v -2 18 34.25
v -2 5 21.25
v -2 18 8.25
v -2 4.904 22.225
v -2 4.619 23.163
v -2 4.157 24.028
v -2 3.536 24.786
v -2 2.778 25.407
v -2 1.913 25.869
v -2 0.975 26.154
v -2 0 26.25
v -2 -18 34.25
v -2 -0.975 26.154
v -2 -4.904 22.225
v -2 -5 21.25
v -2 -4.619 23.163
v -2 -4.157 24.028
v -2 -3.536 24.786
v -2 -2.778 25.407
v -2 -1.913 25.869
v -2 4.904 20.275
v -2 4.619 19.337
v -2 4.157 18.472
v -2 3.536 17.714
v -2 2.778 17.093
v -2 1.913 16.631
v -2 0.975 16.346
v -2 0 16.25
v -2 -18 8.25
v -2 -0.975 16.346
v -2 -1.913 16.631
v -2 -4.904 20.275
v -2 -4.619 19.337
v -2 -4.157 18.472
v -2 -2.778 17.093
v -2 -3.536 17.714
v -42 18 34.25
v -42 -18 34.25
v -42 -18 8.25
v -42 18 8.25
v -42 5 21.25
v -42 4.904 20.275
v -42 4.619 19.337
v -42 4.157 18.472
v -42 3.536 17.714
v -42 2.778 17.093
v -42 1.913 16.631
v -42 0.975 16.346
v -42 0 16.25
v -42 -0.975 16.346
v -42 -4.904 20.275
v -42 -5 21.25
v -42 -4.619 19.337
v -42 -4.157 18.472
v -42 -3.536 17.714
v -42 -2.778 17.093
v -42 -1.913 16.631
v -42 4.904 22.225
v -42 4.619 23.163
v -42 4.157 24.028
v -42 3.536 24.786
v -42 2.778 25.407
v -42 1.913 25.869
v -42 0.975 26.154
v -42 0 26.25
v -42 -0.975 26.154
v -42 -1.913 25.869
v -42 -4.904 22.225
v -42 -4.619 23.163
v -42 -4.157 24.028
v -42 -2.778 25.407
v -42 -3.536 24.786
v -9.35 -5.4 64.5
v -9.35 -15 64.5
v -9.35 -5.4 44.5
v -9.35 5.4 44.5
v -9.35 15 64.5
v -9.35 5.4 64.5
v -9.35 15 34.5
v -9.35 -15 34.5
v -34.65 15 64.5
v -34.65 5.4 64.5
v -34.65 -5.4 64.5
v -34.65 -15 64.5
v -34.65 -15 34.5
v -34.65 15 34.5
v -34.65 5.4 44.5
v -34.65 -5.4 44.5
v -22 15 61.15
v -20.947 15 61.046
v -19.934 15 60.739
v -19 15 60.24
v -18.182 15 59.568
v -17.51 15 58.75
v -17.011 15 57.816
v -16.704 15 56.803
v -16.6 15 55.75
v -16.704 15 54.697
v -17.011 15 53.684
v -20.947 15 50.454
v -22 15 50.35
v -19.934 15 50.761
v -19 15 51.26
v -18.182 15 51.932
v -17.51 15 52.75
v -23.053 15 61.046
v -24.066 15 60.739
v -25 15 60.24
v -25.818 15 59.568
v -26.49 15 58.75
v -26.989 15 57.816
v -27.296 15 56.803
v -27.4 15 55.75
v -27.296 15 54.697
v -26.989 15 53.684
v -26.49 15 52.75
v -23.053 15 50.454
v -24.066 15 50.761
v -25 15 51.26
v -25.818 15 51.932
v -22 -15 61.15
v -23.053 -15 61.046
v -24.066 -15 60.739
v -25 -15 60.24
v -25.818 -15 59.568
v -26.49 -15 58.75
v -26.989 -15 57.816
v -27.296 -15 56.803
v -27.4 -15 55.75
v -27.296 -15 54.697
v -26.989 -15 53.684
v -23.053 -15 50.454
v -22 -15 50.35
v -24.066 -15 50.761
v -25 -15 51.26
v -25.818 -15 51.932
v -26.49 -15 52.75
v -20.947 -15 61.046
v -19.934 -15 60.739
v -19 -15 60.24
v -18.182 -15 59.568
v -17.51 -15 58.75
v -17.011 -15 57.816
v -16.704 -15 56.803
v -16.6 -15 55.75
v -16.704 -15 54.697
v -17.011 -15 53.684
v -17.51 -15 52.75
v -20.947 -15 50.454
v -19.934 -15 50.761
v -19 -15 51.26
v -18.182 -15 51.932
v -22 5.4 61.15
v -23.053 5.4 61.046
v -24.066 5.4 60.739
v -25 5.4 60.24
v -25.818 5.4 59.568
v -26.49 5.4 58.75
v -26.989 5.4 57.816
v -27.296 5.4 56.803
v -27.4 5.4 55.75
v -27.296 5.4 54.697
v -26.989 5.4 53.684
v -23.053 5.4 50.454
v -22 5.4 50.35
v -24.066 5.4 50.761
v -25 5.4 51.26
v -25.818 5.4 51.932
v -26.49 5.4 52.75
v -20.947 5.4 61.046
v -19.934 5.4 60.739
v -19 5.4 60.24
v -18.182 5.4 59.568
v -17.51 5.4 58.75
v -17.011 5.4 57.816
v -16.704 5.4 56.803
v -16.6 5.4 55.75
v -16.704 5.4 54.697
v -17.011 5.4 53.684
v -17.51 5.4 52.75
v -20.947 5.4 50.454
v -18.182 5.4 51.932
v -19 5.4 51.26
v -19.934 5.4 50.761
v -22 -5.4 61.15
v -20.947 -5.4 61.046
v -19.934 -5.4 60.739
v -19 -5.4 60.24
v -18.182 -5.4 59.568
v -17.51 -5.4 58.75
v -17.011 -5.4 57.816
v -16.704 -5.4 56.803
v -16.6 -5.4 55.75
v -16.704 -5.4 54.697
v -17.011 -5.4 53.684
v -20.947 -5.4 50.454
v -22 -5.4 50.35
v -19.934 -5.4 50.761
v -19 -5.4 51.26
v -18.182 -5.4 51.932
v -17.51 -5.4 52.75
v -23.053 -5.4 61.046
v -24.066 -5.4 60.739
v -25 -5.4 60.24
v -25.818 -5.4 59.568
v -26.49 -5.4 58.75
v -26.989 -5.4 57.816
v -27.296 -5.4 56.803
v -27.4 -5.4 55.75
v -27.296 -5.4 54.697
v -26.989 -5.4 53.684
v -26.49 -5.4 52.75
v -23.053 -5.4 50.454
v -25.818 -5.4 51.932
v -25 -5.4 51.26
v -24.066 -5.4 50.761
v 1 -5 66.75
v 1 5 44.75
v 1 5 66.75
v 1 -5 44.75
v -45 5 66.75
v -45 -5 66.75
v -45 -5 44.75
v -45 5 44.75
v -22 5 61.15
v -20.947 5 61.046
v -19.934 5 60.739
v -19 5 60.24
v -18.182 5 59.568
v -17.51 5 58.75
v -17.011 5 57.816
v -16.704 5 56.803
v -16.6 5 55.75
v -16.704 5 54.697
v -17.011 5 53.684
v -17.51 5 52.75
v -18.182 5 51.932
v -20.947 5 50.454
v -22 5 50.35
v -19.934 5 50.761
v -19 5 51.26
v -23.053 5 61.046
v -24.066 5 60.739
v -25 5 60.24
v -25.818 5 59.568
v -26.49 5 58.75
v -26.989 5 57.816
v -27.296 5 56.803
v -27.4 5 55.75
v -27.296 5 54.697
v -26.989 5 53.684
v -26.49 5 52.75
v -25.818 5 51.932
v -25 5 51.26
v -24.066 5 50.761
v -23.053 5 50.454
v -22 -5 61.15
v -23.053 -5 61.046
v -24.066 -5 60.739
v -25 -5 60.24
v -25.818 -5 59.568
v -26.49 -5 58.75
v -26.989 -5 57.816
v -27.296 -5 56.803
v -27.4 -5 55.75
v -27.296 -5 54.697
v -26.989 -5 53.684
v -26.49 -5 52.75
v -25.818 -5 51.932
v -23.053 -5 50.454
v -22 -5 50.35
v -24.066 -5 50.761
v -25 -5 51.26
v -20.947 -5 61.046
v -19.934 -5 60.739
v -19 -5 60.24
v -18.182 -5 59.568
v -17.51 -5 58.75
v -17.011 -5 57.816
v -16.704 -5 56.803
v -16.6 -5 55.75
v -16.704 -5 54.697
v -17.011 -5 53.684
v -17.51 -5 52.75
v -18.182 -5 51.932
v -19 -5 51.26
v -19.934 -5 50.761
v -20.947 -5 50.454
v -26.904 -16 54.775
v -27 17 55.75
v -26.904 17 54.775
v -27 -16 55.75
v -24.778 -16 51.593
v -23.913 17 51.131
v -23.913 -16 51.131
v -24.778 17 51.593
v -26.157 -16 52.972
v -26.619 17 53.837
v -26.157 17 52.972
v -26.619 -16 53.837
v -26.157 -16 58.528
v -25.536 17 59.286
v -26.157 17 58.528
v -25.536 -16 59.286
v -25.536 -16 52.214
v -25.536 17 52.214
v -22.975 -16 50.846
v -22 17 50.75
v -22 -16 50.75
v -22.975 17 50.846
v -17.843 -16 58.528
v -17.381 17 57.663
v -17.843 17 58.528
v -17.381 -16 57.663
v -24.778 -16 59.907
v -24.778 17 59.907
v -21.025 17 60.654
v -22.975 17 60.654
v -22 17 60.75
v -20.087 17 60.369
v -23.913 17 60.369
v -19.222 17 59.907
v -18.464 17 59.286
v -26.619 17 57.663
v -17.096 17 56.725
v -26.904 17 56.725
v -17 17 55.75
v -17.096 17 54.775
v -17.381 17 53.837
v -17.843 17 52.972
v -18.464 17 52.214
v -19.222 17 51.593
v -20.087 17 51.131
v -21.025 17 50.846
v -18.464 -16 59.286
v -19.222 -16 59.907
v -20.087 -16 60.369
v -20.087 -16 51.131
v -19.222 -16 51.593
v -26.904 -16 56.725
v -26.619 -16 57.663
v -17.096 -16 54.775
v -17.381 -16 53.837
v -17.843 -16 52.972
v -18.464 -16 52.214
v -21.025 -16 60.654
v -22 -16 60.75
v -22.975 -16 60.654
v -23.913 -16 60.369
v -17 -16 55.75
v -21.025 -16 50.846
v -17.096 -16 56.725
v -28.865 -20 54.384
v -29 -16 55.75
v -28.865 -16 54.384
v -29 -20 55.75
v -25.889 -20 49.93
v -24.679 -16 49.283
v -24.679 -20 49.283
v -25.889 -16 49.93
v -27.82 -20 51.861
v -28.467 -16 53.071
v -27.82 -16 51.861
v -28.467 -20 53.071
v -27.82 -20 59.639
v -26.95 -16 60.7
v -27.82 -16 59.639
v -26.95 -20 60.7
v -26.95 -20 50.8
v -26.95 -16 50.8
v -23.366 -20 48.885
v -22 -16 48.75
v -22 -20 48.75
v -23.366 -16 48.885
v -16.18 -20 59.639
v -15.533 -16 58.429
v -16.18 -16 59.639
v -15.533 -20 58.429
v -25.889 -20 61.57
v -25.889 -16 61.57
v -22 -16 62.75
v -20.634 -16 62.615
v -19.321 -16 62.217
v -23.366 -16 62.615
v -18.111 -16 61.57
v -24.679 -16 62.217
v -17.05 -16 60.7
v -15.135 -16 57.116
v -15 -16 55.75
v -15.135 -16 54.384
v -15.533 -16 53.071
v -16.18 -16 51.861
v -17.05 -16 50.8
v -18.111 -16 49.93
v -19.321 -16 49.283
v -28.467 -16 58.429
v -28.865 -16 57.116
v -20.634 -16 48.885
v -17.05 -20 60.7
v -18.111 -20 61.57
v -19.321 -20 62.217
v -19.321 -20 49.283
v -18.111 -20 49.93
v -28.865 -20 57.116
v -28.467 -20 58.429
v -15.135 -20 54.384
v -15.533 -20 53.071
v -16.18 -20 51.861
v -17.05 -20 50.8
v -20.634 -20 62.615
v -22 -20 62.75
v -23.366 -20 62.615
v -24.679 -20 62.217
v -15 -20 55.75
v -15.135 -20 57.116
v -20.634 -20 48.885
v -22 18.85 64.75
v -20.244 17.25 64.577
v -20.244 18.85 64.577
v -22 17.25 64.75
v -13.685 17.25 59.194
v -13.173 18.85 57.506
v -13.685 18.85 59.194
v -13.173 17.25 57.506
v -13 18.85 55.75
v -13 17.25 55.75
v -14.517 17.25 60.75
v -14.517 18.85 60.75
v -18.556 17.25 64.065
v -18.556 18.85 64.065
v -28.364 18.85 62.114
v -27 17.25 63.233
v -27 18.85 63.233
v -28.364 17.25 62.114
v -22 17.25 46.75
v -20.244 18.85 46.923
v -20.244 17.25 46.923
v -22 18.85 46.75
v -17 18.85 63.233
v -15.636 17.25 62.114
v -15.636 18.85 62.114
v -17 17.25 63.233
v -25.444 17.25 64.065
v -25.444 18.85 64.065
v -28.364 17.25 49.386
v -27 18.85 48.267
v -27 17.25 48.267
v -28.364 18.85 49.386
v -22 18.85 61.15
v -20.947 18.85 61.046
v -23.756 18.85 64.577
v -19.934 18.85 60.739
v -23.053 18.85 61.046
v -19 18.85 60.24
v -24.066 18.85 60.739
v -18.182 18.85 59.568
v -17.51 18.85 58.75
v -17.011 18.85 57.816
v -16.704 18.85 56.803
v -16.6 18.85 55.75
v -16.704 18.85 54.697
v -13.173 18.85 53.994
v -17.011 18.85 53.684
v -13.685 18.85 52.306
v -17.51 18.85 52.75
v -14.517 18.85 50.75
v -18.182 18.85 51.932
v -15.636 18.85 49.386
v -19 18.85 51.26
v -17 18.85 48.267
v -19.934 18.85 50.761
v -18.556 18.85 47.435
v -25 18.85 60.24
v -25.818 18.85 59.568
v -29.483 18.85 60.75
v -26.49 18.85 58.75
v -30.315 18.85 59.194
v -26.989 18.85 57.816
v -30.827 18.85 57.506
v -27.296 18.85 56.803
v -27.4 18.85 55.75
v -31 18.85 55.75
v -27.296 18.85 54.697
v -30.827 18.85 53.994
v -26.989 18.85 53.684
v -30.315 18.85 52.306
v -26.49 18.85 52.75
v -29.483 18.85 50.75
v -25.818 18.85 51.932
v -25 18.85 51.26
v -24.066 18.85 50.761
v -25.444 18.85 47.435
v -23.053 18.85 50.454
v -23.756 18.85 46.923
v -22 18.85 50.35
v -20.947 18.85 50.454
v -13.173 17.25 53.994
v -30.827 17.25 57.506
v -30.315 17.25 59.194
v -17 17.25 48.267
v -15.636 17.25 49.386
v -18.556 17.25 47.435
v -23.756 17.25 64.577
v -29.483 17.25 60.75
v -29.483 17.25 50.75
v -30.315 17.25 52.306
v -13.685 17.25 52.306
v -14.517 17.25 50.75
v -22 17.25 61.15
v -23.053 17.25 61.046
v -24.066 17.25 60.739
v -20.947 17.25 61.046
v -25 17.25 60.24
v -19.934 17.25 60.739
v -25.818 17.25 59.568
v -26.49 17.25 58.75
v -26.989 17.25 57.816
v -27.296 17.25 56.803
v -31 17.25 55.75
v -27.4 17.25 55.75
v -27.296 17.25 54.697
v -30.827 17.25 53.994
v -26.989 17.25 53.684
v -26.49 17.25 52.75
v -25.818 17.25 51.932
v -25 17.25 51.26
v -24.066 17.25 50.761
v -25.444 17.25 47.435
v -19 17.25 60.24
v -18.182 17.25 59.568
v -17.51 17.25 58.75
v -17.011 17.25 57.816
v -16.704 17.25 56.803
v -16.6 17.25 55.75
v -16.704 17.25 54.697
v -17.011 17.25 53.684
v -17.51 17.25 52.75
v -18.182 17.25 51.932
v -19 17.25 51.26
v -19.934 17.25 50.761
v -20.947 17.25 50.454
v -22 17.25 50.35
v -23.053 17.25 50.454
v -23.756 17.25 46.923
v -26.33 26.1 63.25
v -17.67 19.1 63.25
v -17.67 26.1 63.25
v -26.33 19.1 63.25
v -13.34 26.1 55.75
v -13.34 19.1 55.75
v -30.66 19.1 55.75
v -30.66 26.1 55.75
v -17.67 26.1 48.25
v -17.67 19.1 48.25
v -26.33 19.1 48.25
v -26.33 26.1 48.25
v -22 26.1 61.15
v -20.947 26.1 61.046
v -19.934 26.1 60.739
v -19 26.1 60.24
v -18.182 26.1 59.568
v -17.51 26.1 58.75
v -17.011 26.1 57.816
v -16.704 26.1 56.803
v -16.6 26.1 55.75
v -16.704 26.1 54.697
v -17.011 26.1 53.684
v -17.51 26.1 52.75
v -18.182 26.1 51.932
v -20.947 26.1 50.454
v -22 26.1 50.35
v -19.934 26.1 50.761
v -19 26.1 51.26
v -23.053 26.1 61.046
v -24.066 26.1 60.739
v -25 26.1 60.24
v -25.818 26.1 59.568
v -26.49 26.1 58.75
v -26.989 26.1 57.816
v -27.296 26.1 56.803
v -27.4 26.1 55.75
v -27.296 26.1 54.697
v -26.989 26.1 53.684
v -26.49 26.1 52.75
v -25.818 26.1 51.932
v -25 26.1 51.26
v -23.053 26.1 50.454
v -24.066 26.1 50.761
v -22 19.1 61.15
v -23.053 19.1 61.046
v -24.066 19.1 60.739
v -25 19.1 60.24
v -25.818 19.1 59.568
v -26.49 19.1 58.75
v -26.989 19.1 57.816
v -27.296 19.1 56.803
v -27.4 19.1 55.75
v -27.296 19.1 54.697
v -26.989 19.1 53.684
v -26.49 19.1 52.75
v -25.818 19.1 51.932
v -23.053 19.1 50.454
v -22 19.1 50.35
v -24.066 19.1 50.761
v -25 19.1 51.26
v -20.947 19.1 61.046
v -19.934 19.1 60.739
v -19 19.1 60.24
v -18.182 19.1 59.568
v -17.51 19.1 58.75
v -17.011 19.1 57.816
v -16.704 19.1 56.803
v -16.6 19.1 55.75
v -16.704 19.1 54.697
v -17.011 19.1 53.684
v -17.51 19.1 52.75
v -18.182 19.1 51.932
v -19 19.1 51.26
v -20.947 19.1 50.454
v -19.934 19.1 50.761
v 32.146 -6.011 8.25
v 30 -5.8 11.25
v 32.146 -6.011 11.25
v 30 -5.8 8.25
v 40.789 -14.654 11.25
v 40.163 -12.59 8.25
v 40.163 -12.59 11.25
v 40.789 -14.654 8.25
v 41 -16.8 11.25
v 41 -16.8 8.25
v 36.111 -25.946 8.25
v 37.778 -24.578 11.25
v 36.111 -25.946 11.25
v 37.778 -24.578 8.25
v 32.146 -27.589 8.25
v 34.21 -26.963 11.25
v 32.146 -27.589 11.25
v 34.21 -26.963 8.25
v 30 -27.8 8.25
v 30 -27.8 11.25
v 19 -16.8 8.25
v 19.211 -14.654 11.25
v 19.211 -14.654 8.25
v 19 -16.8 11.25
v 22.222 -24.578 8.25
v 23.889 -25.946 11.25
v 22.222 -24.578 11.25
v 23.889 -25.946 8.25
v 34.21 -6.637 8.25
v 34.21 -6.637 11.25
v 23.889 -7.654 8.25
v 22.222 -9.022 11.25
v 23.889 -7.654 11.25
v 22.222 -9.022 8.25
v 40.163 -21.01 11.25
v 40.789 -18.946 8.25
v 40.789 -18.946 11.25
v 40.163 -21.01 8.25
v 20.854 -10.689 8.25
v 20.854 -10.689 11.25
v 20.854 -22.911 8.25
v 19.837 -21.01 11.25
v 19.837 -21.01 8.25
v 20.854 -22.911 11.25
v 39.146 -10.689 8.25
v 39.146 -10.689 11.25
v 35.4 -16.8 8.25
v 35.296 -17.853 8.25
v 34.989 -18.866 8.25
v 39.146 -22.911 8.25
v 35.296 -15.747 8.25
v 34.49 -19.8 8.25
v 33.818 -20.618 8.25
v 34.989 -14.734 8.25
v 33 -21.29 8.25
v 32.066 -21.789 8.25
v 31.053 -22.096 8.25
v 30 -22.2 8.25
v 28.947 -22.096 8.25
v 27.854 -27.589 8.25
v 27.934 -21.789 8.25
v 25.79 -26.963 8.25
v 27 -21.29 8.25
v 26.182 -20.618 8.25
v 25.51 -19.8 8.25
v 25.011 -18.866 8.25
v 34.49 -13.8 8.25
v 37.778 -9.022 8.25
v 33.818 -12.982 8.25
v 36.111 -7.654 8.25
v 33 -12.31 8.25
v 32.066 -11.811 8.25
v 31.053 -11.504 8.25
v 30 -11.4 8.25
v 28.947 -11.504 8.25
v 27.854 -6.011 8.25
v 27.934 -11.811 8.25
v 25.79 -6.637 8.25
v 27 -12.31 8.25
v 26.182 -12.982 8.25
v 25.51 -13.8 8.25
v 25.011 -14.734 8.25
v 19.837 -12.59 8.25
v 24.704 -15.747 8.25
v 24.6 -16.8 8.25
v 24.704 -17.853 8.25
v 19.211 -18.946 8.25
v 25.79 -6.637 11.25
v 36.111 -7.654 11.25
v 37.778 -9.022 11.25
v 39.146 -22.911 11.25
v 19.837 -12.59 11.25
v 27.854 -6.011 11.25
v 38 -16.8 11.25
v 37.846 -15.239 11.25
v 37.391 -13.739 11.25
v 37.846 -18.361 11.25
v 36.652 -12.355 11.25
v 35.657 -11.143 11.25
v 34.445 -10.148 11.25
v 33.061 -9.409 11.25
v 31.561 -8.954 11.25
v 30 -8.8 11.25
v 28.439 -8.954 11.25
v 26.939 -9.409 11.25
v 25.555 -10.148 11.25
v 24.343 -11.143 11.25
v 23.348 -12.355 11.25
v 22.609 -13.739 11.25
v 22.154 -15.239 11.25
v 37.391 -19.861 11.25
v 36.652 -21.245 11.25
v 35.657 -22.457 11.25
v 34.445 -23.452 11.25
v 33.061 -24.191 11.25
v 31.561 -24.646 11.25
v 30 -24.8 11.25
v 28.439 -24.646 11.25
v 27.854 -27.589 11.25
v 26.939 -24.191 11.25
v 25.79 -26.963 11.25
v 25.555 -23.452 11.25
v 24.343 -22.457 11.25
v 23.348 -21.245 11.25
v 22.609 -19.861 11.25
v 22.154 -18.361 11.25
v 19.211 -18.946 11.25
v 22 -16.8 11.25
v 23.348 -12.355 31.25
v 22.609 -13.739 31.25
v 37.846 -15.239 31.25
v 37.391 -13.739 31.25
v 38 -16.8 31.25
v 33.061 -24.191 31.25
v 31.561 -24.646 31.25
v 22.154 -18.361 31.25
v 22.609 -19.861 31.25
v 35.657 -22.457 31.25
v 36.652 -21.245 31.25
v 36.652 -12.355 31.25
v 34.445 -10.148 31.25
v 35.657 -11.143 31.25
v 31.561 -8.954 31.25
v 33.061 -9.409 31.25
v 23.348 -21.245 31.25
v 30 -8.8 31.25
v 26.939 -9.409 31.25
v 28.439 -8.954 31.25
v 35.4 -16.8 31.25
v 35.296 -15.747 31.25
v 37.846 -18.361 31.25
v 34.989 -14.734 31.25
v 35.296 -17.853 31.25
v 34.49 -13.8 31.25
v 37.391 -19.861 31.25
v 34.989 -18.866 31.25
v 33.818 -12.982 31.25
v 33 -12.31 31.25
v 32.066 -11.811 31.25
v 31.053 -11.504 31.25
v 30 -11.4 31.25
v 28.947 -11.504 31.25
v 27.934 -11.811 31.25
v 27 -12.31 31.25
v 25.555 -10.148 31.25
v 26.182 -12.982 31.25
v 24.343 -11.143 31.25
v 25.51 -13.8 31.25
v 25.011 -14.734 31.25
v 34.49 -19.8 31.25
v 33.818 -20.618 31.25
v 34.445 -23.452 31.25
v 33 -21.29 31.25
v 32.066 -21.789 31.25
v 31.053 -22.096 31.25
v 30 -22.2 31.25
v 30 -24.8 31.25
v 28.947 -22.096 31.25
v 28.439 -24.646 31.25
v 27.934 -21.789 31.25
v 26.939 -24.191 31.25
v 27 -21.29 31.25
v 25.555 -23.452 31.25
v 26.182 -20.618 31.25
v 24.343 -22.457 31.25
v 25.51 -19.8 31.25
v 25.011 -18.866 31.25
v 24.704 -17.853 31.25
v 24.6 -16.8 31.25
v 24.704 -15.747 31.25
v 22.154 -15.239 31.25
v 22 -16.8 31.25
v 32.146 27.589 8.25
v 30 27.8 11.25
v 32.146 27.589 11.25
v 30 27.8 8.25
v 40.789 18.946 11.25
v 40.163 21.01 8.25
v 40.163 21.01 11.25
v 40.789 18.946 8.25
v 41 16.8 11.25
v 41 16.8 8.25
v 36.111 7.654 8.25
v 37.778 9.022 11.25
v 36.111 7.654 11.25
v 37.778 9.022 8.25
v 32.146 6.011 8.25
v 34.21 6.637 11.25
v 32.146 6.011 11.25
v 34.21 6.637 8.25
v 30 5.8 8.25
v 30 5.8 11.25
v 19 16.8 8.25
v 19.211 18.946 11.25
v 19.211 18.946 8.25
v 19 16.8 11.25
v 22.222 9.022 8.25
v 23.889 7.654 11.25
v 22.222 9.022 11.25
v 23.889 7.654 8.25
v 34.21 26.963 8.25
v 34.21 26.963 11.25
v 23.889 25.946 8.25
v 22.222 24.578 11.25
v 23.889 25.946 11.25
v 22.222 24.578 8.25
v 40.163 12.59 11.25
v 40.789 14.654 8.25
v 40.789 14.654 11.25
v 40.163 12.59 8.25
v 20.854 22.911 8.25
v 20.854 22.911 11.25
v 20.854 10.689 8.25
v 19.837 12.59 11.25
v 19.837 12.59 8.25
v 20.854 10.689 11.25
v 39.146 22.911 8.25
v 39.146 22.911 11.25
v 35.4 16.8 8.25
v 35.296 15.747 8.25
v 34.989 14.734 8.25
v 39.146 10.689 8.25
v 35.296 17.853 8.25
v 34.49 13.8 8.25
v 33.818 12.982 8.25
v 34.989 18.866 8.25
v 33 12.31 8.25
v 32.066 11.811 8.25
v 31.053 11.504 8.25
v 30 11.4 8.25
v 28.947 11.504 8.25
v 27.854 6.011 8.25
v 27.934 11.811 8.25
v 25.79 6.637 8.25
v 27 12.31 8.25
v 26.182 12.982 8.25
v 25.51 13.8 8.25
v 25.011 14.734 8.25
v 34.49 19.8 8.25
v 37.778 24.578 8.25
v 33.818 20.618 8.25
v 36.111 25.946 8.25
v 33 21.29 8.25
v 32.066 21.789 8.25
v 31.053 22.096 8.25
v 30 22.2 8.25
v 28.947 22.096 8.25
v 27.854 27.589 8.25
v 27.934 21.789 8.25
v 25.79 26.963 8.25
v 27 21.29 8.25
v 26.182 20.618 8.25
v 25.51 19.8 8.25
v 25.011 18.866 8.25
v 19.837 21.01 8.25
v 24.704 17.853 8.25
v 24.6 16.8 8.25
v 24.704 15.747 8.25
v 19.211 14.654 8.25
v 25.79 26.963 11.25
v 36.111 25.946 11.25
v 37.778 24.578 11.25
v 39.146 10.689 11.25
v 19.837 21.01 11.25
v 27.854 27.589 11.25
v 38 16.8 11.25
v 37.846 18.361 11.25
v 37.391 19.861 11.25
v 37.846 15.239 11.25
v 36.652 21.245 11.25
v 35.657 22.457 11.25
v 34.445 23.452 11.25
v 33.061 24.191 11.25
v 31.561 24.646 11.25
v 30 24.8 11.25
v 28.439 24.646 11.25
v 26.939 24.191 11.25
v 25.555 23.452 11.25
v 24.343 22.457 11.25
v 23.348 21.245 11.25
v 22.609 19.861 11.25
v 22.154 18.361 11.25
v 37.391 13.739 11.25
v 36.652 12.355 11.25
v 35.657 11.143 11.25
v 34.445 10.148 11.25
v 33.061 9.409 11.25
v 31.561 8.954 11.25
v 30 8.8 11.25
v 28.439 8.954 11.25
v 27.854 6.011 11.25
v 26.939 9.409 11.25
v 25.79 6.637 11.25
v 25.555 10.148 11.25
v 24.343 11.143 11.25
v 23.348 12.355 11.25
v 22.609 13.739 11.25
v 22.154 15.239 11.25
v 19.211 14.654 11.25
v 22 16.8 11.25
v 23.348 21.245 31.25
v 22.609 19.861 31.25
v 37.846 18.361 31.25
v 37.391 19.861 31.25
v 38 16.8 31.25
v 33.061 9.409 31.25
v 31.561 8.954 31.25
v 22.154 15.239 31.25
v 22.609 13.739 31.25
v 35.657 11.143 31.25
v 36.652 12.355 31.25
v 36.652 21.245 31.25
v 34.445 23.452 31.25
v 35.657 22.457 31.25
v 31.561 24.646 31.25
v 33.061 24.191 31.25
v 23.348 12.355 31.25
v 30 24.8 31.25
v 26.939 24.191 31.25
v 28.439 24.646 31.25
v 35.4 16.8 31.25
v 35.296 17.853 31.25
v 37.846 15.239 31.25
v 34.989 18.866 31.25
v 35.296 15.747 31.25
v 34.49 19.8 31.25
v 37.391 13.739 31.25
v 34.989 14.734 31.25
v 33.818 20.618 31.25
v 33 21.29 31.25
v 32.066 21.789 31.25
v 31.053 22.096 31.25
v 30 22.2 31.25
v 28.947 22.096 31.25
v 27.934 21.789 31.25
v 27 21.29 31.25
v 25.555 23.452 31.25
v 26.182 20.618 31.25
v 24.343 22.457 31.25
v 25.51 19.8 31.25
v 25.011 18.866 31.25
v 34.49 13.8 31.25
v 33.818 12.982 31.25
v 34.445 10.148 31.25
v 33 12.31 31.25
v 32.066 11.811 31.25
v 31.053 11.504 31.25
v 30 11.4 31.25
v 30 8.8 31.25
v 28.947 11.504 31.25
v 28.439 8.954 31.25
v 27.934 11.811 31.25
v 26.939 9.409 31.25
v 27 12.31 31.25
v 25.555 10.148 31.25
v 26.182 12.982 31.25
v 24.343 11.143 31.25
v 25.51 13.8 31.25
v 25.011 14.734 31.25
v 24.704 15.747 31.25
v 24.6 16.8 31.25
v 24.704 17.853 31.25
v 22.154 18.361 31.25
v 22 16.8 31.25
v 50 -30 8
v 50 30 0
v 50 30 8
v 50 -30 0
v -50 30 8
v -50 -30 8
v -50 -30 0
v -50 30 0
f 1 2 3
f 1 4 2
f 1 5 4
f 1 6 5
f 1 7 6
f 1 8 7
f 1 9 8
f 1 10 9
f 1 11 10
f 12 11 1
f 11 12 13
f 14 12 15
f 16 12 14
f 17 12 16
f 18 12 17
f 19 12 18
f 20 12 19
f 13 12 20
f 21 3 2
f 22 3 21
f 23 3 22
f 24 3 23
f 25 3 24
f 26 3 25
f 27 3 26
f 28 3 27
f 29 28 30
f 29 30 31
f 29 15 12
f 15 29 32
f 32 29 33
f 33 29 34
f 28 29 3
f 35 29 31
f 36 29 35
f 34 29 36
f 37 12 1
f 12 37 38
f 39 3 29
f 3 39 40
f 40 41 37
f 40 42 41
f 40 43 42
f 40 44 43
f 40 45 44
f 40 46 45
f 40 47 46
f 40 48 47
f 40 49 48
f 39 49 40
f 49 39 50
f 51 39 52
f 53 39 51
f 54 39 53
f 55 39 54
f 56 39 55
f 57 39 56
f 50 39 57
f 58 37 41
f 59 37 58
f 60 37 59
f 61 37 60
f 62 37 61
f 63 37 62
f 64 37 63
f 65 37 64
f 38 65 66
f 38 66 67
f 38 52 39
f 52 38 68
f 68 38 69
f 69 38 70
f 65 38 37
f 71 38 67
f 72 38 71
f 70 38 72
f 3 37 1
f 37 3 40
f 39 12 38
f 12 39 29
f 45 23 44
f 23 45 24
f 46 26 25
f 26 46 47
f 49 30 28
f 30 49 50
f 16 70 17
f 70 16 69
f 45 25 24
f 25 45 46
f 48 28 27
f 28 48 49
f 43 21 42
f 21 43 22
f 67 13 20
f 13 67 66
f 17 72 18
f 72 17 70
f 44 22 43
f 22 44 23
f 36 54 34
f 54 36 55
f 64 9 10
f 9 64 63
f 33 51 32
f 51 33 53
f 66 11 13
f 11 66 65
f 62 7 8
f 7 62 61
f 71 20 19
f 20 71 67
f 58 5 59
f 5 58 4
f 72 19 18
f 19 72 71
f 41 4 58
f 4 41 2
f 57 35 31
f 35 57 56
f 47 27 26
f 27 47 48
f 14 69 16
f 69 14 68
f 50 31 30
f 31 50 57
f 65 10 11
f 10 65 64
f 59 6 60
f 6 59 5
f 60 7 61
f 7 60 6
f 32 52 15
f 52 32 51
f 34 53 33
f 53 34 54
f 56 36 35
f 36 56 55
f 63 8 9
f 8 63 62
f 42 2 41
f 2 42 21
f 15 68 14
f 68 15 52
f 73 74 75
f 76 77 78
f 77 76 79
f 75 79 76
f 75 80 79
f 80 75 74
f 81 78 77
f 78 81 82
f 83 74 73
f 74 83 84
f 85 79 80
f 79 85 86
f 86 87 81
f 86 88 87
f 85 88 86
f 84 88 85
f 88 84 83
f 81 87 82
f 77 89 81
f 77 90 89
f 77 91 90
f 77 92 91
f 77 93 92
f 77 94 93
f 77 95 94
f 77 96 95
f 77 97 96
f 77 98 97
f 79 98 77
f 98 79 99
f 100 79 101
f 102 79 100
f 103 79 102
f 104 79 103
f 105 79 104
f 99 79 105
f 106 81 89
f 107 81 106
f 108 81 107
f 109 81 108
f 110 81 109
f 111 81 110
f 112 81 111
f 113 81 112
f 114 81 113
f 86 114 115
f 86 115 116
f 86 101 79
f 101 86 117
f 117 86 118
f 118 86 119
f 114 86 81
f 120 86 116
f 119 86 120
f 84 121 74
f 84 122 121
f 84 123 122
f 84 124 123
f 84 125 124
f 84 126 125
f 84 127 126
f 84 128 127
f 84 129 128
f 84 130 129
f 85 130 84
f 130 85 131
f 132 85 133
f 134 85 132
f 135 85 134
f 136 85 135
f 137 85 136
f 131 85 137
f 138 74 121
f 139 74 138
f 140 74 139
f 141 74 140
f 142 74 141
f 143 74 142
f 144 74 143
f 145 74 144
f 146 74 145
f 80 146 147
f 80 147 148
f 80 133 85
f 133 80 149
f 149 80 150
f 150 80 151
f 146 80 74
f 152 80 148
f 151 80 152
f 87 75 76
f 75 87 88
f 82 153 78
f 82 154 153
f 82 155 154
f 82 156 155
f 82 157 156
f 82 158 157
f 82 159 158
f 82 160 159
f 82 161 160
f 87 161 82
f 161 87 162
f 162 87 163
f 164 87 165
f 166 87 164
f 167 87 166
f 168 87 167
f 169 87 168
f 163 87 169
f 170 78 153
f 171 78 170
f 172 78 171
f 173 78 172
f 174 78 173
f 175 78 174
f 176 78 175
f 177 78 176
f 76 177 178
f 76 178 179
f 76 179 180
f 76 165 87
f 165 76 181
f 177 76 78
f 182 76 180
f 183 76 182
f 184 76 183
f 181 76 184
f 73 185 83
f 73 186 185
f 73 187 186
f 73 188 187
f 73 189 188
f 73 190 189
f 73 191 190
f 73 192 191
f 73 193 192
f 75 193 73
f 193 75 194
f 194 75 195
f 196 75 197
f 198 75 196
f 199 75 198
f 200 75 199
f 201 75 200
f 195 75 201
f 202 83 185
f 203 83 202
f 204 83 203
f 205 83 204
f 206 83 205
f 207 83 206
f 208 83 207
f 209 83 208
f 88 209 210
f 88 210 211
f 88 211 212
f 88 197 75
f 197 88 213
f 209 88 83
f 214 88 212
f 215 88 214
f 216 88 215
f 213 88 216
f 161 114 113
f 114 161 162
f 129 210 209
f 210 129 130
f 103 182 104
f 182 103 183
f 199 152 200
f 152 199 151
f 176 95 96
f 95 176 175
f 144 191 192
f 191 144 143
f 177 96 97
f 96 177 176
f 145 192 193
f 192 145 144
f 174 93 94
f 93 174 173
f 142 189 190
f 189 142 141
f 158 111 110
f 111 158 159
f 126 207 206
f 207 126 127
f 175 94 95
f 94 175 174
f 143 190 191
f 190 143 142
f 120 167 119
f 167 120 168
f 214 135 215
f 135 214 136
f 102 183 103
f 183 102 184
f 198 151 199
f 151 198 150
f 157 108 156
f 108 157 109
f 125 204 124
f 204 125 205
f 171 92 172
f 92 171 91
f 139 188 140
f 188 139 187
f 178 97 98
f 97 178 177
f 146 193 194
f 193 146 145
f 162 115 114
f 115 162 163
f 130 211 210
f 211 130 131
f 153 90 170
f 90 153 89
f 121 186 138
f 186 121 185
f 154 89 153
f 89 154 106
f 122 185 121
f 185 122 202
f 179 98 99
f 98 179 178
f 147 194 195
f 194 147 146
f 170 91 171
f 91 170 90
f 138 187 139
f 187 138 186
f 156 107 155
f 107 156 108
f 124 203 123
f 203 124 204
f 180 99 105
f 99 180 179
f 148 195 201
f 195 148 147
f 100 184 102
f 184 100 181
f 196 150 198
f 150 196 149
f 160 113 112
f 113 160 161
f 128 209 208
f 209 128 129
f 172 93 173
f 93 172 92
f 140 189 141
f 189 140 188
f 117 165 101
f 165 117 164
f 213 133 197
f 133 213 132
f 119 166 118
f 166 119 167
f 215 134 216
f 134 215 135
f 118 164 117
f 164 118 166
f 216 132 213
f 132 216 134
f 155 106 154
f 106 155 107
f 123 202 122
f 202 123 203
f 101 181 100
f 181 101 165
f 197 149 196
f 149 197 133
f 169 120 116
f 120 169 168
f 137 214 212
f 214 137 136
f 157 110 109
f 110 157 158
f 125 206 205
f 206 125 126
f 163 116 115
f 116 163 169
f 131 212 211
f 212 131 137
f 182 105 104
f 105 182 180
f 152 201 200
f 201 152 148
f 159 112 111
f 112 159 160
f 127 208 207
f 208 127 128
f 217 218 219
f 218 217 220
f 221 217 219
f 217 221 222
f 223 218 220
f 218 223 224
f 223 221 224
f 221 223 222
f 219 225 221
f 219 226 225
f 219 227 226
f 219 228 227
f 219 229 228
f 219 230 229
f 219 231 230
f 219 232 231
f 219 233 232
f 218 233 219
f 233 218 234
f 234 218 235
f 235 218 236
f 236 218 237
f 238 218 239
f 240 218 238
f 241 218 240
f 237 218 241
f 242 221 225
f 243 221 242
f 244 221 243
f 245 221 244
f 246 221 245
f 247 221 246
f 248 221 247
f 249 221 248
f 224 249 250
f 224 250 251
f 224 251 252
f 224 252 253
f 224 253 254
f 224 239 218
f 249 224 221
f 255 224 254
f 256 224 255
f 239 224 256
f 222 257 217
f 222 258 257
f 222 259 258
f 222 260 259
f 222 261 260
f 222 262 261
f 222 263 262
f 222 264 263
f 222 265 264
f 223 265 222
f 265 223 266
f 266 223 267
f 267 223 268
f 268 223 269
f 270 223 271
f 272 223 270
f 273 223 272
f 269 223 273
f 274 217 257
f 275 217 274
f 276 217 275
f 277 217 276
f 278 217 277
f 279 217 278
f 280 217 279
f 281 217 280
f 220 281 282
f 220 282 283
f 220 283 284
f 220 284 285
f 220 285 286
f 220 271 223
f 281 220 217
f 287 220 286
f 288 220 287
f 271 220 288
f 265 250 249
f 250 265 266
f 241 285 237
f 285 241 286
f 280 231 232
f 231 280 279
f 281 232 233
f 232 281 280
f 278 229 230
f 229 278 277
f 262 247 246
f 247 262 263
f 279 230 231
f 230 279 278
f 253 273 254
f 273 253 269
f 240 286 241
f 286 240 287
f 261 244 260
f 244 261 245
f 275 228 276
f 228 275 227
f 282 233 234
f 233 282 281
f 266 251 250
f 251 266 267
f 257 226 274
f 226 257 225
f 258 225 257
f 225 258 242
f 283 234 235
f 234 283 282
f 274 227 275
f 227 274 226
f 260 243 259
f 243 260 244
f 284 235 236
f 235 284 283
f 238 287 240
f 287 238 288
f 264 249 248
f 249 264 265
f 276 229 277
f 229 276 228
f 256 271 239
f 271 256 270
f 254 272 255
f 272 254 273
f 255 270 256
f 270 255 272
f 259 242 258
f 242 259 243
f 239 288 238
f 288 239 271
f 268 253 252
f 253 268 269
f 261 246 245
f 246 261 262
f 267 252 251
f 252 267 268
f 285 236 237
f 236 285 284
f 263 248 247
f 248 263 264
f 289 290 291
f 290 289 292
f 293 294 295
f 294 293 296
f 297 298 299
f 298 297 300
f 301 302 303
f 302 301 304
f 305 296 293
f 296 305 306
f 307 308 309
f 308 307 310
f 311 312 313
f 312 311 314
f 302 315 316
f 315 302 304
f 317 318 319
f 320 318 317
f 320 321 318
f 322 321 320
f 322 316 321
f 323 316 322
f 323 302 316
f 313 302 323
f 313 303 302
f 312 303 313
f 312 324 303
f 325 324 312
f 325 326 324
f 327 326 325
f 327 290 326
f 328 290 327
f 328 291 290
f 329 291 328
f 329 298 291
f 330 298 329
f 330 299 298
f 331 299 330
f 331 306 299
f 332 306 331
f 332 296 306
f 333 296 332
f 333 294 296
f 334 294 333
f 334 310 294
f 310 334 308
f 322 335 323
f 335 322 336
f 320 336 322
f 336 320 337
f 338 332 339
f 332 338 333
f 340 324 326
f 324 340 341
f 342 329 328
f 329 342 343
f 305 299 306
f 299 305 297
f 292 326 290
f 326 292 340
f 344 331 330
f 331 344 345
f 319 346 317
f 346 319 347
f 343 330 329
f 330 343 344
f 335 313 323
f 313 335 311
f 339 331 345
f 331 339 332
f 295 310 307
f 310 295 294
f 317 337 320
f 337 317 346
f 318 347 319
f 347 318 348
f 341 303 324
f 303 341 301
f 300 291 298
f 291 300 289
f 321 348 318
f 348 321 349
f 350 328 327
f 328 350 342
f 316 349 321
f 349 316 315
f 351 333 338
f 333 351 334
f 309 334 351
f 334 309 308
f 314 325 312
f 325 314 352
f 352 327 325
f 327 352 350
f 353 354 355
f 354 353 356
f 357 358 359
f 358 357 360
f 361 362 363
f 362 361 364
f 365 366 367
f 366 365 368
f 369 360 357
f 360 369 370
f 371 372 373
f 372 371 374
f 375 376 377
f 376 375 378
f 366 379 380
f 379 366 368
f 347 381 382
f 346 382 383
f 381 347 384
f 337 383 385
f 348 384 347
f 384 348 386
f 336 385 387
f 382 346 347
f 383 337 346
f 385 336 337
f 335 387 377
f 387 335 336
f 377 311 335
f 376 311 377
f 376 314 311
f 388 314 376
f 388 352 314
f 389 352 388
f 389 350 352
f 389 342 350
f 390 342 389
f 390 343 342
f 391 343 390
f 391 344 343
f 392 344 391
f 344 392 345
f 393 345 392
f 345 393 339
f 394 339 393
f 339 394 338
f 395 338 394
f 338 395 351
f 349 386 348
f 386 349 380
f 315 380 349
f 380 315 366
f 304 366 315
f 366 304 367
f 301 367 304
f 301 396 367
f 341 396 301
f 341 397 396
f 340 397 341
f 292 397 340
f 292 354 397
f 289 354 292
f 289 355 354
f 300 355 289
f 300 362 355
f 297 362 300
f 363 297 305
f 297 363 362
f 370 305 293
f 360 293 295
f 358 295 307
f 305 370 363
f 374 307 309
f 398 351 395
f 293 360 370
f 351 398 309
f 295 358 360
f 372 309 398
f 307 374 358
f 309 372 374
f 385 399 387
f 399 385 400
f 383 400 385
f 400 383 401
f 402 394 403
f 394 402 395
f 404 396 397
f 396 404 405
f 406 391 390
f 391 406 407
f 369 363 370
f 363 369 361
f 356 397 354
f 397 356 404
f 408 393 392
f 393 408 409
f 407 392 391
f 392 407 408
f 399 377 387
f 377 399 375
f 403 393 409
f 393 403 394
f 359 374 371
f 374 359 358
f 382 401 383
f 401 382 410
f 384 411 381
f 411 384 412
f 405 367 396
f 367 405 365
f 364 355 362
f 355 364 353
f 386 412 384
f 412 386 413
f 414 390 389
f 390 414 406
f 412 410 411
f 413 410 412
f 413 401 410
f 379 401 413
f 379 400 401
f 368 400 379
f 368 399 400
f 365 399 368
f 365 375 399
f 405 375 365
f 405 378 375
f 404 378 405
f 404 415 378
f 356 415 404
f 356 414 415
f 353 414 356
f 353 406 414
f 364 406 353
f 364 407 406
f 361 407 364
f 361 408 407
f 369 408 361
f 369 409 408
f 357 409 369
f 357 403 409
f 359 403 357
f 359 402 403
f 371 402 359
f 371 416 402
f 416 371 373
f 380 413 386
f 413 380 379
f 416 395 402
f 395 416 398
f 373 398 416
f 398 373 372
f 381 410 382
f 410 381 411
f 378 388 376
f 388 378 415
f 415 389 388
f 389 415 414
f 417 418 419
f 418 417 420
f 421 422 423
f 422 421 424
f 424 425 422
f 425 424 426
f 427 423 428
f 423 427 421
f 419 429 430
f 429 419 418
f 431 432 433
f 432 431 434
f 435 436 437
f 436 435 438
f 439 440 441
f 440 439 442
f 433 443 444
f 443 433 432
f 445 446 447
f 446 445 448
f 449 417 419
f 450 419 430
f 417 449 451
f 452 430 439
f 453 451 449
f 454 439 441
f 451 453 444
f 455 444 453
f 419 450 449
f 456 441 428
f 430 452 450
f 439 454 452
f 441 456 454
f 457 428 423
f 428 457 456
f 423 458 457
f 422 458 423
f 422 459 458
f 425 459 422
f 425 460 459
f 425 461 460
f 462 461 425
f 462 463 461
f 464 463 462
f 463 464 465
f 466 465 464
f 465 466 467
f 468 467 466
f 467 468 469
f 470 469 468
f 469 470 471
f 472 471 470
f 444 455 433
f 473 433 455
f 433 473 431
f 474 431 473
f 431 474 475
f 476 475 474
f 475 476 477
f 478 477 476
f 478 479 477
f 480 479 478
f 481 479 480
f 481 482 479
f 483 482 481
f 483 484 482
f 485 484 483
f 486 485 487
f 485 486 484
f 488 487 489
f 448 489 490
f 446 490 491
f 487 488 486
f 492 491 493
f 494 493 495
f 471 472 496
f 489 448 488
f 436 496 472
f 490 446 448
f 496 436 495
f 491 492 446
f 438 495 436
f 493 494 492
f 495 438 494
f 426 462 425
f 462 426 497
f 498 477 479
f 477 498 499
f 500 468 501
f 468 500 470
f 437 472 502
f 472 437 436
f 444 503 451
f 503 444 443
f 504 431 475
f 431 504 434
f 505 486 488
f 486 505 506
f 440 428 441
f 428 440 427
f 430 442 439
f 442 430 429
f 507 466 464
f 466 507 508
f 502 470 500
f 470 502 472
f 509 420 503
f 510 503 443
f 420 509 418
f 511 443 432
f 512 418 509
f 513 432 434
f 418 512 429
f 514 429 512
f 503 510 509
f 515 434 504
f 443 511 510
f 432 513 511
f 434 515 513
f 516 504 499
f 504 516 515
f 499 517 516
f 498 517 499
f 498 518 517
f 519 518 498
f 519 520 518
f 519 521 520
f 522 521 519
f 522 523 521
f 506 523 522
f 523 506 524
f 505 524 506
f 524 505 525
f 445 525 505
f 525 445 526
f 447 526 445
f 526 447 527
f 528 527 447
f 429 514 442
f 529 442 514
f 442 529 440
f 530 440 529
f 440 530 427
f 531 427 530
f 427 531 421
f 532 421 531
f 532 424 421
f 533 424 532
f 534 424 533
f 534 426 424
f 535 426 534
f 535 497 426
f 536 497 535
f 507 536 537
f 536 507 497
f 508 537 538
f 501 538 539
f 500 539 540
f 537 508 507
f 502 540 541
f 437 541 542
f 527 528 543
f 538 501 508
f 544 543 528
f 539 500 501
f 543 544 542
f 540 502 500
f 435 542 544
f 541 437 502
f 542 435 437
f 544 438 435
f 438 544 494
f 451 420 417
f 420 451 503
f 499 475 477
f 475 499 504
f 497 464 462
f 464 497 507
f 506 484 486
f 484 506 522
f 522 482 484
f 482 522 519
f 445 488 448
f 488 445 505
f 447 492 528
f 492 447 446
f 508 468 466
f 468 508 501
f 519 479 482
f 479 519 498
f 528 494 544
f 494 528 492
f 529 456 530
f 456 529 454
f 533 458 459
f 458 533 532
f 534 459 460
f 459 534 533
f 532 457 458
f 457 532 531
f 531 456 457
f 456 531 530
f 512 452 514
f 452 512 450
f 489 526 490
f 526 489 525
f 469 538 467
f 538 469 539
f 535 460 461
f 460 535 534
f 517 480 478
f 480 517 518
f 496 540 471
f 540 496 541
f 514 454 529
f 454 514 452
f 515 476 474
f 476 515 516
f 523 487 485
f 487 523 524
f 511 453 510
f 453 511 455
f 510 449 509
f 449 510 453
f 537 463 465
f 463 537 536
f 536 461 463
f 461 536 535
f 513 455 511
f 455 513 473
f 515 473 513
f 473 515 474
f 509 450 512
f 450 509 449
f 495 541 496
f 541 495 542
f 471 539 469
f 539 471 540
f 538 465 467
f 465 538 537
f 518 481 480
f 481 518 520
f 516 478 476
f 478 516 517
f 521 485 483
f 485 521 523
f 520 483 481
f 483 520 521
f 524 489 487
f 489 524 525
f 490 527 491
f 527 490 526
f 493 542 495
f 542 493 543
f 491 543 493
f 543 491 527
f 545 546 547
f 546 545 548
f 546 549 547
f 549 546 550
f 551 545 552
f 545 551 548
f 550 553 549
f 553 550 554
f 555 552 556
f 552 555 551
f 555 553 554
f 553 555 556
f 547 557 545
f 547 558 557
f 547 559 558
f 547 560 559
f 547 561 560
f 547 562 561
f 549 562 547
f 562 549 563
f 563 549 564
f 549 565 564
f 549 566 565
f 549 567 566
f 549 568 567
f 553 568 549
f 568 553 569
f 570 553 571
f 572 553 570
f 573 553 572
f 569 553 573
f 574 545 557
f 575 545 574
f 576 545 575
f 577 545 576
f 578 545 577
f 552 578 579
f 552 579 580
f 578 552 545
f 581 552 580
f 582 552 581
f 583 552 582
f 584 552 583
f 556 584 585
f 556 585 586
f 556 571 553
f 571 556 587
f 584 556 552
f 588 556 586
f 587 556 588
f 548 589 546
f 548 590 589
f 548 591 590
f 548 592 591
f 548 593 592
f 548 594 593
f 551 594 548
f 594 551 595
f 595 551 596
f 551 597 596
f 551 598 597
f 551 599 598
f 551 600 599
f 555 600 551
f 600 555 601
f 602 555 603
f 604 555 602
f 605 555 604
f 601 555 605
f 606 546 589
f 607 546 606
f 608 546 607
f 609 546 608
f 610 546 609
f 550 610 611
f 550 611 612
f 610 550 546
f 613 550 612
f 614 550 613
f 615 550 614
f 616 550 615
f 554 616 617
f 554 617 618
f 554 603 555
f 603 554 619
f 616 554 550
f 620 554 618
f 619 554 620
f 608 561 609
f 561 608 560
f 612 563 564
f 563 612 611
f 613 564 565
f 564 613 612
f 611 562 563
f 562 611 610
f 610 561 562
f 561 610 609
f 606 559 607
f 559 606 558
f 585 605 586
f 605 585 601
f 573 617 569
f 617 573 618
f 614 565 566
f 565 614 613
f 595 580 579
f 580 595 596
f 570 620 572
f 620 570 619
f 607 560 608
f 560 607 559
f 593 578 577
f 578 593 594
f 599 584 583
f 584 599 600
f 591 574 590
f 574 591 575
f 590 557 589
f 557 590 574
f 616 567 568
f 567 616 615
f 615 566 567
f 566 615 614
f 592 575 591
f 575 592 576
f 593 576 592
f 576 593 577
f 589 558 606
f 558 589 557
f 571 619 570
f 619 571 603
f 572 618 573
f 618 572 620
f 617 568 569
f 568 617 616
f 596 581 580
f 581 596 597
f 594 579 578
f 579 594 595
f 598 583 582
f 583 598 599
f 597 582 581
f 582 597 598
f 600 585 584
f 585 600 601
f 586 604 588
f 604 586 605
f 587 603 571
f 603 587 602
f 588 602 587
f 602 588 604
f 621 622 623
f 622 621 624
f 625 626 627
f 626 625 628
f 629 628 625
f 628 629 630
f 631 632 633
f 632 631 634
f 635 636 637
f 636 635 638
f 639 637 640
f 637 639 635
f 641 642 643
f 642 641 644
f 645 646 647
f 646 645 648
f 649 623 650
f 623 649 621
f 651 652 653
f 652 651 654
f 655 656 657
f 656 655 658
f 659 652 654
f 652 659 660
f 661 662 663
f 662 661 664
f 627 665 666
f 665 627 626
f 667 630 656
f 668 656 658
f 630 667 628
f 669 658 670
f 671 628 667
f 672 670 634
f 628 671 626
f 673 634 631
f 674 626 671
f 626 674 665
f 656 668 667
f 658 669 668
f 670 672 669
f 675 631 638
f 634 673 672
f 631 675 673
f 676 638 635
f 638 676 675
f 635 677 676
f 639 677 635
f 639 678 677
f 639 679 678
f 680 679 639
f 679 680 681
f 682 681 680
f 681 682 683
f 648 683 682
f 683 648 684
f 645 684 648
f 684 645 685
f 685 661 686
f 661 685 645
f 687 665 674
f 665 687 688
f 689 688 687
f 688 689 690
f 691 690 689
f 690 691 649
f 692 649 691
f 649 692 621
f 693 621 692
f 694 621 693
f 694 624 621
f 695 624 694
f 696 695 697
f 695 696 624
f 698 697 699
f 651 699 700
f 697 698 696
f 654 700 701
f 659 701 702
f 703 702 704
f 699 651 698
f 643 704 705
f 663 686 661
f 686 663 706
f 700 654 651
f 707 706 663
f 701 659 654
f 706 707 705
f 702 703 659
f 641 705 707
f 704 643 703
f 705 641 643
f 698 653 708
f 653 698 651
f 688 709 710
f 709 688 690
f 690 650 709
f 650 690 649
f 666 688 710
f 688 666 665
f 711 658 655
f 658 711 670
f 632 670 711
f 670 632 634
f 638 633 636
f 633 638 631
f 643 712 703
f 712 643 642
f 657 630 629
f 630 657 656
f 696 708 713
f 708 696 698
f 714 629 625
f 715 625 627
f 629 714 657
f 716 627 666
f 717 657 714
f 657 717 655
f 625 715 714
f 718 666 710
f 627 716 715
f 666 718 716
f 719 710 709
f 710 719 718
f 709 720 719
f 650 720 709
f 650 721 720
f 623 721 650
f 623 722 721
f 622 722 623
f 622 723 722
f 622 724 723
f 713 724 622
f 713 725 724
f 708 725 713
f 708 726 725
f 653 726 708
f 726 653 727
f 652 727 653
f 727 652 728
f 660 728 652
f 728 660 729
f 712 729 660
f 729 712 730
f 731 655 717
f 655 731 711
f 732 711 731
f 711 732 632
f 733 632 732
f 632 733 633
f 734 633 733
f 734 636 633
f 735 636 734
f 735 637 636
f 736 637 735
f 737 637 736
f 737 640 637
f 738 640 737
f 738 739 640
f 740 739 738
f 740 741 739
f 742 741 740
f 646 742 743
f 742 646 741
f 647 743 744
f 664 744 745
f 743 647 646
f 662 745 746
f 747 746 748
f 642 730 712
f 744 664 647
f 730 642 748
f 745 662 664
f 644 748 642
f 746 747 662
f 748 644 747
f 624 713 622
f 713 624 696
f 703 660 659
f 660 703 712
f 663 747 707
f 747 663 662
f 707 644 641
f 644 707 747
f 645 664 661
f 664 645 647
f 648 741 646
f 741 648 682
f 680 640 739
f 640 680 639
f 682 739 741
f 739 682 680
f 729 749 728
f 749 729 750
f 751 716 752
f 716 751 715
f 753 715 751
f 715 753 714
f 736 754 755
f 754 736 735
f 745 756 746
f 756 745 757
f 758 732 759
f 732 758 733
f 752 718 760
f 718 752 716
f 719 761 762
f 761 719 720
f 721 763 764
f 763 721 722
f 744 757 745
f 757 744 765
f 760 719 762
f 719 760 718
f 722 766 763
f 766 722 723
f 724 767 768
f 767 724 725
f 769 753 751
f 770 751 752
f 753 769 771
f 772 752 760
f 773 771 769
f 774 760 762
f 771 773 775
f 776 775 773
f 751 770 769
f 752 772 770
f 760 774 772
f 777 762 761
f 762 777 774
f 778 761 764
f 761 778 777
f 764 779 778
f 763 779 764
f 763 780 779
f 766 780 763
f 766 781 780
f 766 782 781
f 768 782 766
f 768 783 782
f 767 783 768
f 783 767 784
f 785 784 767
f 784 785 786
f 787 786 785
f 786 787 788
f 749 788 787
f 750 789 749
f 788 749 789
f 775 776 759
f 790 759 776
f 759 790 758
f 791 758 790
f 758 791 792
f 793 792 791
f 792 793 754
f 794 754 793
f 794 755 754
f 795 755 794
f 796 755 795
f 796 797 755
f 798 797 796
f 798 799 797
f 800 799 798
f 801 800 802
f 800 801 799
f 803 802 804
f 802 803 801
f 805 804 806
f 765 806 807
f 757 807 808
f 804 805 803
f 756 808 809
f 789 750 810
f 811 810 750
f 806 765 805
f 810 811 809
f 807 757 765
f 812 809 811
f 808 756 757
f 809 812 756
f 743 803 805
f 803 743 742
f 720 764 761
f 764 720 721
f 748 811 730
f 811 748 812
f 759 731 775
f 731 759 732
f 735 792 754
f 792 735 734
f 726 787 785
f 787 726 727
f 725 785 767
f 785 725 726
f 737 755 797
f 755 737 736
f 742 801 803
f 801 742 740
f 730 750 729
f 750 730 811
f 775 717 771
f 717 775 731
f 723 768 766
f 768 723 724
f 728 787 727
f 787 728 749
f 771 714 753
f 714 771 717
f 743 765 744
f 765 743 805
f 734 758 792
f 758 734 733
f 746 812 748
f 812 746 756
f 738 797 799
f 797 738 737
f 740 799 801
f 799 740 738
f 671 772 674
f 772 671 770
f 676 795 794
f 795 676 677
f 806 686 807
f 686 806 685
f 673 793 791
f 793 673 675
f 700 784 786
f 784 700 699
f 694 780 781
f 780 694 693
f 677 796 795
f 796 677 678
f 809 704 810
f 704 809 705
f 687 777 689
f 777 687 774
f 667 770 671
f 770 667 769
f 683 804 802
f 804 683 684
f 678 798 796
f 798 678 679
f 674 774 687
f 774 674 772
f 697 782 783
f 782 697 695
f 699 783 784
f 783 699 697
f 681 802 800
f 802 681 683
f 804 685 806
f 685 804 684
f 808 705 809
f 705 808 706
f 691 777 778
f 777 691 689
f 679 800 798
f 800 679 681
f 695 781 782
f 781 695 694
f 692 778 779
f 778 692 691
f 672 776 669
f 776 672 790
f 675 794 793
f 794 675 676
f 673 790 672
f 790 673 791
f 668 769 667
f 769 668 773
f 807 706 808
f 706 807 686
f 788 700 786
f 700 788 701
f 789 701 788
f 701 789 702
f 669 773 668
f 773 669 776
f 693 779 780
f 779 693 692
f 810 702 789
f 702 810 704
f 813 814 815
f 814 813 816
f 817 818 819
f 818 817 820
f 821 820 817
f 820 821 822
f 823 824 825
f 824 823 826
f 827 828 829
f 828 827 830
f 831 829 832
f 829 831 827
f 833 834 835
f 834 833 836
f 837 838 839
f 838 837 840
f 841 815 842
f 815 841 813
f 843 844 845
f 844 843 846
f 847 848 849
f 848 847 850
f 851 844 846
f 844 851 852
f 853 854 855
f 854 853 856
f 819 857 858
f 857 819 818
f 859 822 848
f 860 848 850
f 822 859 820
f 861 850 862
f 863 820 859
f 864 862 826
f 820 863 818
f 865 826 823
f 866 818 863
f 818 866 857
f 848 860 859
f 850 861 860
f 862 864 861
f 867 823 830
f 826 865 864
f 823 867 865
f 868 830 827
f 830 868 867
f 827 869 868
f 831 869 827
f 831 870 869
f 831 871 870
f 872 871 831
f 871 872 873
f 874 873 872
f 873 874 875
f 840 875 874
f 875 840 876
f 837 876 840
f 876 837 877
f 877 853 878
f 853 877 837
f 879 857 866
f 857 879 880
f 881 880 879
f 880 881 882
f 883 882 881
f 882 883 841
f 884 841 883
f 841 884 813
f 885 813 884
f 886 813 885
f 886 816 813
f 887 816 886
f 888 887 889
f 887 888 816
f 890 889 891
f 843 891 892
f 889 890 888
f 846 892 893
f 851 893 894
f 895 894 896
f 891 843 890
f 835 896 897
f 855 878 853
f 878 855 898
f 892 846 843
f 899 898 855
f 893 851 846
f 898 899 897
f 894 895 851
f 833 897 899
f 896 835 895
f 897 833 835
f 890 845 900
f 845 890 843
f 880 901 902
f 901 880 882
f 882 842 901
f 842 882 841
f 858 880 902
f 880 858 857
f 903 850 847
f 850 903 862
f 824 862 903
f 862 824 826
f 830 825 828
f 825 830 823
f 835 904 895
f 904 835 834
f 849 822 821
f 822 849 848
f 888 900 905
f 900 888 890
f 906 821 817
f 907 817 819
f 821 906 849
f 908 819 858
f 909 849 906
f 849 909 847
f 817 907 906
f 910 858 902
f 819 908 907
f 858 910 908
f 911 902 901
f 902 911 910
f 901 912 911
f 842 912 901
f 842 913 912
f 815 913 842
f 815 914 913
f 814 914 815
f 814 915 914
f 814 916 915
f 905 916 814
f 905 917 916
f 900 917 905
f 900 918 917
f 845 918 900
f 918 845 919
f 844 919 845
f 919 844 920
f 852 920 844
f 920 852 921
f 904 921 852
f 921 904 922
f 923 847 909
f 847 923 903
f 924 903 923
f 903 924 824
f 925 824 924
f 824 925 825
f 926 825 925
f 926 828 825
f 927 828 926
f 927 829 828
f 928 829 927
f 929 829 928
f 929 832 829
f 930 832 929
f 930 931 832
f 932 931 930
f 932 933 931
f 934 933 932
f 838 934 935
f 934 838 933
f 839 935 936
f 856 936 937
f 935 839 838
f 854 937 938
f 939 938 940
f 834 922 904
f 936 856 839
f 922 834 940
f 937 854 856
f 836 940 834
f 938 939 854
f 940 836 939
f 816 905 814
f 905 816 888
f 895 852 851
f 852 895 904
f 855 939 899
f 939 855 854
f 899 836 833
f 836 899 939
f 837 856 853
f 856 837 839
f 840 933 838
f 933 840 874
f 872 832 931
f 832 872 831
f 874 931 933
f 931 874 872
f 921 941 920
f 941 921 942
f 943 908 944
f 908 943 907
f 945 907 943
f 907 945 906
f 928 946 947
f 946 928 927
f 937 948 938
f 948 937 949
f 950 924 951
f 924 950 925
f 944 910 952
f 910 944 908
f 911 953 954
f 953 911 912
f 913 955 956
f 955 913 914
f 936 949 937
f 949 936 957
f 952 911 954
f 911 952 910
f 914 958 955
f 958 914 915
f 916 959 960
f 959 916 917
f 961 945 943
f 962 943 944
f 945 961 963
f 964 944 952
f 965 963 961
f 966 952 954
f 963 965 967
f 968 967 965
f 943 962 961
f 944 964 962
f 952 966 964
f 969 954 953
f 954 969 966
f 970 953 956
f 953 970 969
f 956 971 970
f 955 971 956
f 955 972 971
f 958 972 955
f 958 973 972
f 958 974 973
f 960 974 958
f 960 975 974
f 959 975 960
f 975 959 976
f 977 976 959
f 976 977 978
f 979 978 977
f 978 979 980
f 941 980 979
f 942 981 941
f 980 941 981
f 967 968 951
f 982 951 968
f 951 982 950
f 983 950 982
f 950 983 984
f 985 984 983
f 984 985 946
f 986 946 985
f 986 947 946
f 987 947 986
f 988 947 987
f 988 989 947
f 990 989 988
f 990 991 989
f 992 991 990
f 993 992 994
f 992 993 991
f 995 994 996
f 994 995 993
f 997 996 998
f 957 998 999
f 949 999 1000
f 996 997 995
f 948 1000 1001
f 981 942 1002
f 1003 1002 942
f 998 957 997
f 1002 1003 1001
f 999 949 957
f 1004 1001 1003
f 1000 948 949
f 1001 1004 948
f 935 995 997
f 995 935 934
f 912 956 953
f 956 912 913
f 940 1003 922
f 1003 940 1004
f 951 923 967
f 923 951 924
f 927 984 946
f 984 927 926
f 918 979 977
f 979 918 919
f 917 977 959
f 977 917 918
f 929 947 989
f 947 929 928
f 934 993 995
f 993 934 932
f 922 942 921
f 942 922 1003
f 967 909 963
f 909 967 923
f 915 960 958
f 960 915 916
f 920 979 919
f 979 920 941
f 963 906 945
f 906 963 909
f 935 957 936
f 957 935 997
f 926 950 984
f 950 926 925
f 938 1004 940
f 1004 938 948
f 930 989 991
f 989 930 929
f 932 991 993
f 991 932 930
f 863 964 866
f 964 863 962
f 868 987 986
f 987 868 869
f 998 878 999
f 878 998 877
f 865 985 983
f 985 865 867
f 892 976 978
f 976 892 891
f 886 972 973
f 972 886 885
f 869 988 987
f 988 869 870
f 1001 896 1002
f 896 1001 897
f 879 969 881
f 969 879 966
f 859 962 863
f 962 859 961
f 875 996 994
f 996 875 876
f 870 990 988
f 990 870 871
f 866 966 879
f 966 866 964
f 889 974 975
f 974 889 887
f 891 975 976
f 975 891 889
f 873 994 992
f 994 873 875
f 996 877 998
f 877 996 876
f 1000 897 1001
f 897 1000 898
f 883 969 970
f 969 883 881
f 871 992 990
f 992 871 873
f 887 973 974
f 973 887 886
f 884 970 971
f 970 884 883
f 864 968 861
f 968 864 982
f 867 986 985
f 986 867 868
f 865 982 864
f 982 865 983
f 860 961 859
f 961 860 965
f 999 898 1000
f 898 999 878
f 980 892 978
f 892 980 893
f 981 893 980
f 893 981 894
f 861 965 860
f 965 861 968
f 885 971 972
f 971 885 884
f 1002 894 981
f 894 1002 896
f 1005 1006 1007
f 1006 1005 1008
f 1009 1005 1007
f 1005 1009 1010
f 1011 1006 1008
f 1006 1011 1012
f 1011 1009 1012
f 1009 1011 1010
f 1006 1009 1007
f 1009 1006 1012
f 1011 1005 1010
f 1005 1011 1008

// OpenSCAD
$fn = 32;

// ------------------------------------------------------------------------
// Indexing jig: plate 100 x 60 mm, pin d10
// Every part is its own module, assembly() places every instance.
// ------------------------------------------------------------------------

// --- part 1 ---
module jig_plate() {
  difference() {
    translate([-50, -30, 0]) cube([100, 60, 8]);
  }
}

// --- part 2 ---
module locator_block() {
  difference() {
    translate([-20, -18, 0]) cube([40, 36, 26]);
    translate([0, 0, 13]) rotate([0, 90, 0]) cylinder(h = 42, d = 10, center = true);
  }
}

// --- part 3 ---
module index_fork() {
  difference() {
    translate([-12.65, -15, 0]) cube([25.3, 30, 30]);
    translate([-13.65, -5.4, 10]) cube([27.3, 10.8, 21]);
    translate([0, 0, 21.25]) rotate([90, 0, 0]) cylinder(h = 32, d = 10.8, center = true);
  }
}

// --- part 4 ---
module index_arm() {
  difference() {
    translate([-23, -5, 0]) cube([46, 10, 22]);
    translate([0, 0, 11]) rotate([90, 0, 0]) cylinder(h = 12, d = 10.8, center = true);
  }
}

// --- part 5 ---
module index_pin() {
  rotate([0, 90, 0]) cylinder(h = 34, d = 10, center = true);
  translate([-20, 0, 0]) rotate([0, 90, 0]) cylinder(h = 4, d = 14);
}

// --- part 6 ---
module pin_washer() {
  difference() {
      translate([0, 0, 0]) cylinder(h = 1.6, d = 18);
      translate([0, 0, -1]) cylinder(h = 3.6, d = 10.8);
    }
}

// --- part 7 ---
module lock_nut() {
  difference() {
    linear_extrude(height = 7) polygon(points = [[8.66, 0], [4.33, 7.5], [-4.33, 7.5], [-8.66, 0], [-4.33, -7.5], [4.33, -7.5]]);
    translate([0, 0, -1]) cylinder(h = 9, d = 10.8);
  }
}

// --- part 8 ---
module guide_bush_a() {
  difference() {
    union() {
      cylinder(h = 3, d = 22);
      translate([0, 0, 3]) cylinder(h = 20, d = 16);
    }
    translate([0, 0, -1]) cylinder(h = 25, d = 10.8);
  }
}

// --- part 9 ---
module guide_bush_b() {
  difference() {
    union() {
      cylinder(h = 3, d = 22);
      translate([0, 0, 3]) cylinder(h = 20, d = 16);
    }
    translate([0, 0, -1]) cylinder(h = 25, d = 10.8);
  }
}

// --- assembly ---
module assembly() {
  color([0.80, 0.24, 0.20]) translate([0, 0, 0]) rotate([0, 0, 0]) jig_plate();
  color([0.20, 0.45, 0.75]) translate([-22, 0, 8.25]) rotate([0, 0, 0]) locator_block();
  color([0.25, 0.62, 0.32]) translate([-22, 0, 34.5]) rotate([0, 0, 0]) index_fork();
  color([0.92, 0.70, 0.18]) translate([-22, 0, 44.75]) rotate([0, 0, 0]) index_arm();
  color([0.58, 0.35, 0.70]) translate([-22, 0, 55.75]) rotate([0, 0, 90]) index_pin();
  color([0.16, 0.66, 0.66]) translate([-22, 18.85, 55.75]) rotate([90, 0, 0]) pin_washer();
  color([0.85, 0.48, 0.18]) translate([-22, 26.1, 55.75]) rotate([90, 0, 0]) lock_nut();
  color([0.55, 0.60, 0.65]) translate([30, -16.8, 8.25]) rotate([0, 0, 0]) guide_bush_a();
  color([0.75, 0.30, 0.55]) translate([30, 16.8, 8.25]) rotate([0, 0, 0]) guide_bush_b();
}

assembly();
